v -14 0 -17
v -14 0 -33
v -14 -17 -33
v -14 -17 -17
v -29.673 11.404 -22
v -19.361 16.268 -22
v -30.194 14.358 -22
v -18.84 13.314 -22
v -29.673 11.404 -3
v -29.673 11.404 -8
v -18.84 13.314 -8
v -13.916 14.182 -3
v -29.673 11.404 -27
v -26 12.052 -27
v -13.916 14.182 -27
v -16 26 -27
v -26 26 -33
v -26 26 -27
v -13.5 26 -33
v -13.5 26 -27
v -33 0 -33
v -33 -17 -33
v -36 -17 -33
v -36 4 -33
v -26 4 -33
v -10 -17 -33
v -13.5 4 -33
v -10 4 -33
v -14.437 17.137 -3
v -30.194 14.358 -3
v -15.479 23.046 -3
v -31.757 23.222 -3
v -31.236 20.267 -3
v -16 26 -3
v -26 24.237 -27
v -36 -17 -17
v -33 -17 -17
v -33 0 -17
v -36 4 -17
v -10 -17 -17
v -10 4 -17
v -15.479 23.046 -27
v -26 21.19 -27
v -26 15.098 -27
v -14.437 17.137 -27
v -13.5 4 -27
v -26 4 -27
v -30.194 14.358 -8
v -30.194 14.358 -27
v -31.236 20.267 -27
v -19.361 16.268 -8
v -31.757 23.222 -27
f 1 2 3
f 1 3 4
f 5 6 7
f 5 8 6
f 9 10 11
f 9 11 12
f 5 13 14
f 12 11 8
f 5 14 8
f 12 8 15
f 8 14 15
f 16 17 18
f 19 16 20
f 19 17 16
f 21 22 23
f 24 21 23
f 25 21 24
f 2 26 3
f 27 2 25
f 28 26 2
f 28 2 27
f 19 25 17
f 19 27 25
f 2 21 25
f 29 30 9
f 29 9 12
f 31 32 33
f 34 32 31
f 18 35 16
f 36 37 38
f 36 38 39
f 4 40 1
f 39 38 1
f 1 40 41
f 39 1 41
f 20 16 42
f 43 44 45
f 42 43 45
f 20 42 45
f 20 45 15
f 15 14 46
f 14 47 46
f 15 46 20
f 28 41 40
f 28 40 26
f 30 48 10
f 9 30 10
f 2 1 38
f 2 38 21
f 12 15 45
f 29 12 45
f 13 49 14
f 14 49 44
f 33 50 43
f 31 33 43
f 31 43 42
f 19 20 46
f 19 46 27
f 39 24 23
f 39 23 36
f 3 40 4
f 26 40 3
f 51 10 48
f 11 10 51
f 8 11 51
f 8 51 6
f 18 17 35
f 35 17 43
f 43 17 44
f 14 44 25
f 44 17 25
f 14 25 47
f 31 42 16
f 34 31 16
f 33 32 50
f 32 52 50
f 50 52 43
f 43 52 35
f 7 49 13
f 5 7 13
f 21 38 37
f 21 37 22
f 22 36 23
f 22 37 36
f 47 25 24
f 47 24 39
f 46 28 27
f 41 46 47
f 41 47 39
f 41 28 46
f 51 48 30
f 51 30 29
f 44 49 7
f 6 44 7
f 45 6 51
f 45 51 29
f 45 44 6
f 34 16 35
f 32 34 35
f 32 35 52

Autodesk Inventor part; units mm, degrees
ref_plane "YZ Plane" through (0, 0, 0) normal (1, 0, 0) x (0, 1, 0)
ref_plane "XZ Plane" through (0, 0, 0) normal (0, 1, 0) x (-1, 0, 0)
ref_plane "XY Plane" through (0, 0, 0) normal (0, 0, 1) x (1, 0, 0)
sketch "Sketch1" plane through (0, 0, 0) normal (0, 1, 0) x (-1, 0, 0)
  line L0 (0, 0) -> (26, 0)
  line L1 (26, 0) -> (26, -33)
  line L2 (26, -33) -> (0, -33)
  line L3 (0, -33) -> (0, 0)
  dimension "d0" = 26
  dimension "d1" = 33
extrude "Extrusion1" add sketch "Sketch1" along normal blind 4
sketch "Sketch2" plane through (0, 0, 0) normal (0, -1, 0) x (1, 0, 0)
  line L0 (-26, 0) -> (0, 0) projected
  line L1 (-26, -33) -> (-26, 0) projected
  line L2 (0, -33) -> (-26, -33) projected
  line L3 (0, 0) -> (0, -33) projected
  line L4 (-26, 0) -> (0, 0) projected
  line L5 (-26, -33) -> (-26, 0) projected
  line L6 (0, 0) -> (0, -33) projected
  line L7 (0, -33) -> (-26, -33) projected
  line L8 (0, 0) -> (-4, 0)
  line L9 (-4, 0) -> (-4, -33)
  line L10 (-4, -33) -> (0, -33)
  line L11 (0, -33) -> (0, 0)
  line L12 (-26, -33) -> (-26, 0) projected
  line L13 (-26, 0) -> (-23, 0)
  line L14 (-23, 0) -> (-23, -33)
  line L15 (-23, -33) -> (-26, -33)
  line L16 (-26, -33) -> (-26, 0)
  dimension "d4" = 4
  dimension "d5" = 3
extrude "Extrusion2" add sketch "Sketch2" along normal blind 17 contours L0 L14 L2 L1 | L0 L3 L2 L9
sketch "Sketch3" plane through (0, 4, 0) normal (0, 1, 0) x (1, 0, 0)
  line L0 (0, 33) -> (-26, 33) projected
  line L1 (-26, 33) -> (-26, 0) projected
  line L2 (-26, 0) -> (0, 0) projected
  line L3 (0, 0) -> (0, 33) projected
  line L4 (0, 0) -> (-6, 0)
  line L5 (-6, 0) -> (-6, 33)
  line L6 (-6, 33) -> (0, 33)
  line L7 (0, 33) -> (0, 0)
  line L8 (-6, 33) -> (-26, 33)
  line L9 (-26, 33) -> (-26, 27)
  line L10 (-26, 27) -> (-6, 27)
  line L11 (-6, 27) -> (-6, 33)
  dimension "d8" = 6
  dimension "d9" = 6
extrude "Extrusion3" add sketch "Sketch3" along normal blind 10 contours L5 L10 L1 L0
sketch "Sketch4" plane through (-26, 4, -27) normal (0, 0, 1) x (1, 0, 0)
  line L0 (20, 0) -> (0, 0) projected
  line L1 (20, 0) -> (20, 10) projected
  line L2 (0, 10) -> (20, 10) projected
  line L3 (0, 0) -> (0, 10) projected
  line L4 (20, 10) -> (6, 10)
  line L5 (6, 10) -> (6, 7)
  line L6 (6, 7) -> (20, 7)
  line L7 (20, 7) -> (20, 10)
  line L8 (20, 7) -> (6, 7)
  line L9 (6, 7) -> (6, 1)
  line L10 (6, 1) -> (20, 1)
  line L11 (20, 1) -> (20, 7)
  point P0 (26, -4)
  dimension "d12" = 14
  dimension "d13" = 3
  dimension "d14" = 6
sketch "Sketch5" plane through (0, 14, 0) normal (0, 1, 0) x (1, 0, 0)
  line L0 (-6, 27) -> (-6, 33) projected
  line L1 (-6, 33) -> (-26, 33) projected
  line L2 (-26, 33) -> (-26, 27) projected
  line L3 (-26, 27) -> (-6, 27) projected
  line L4 (-26, 33) -> (-6, 33)
  line L5 (-6, 33) -> (-6, 27)
  line L6 (-6, 27) -> (-26, 27)
  line L7 (-26, 27) -> (-26, 33)
  point P0 (0, 0)
extrude "Extrusion4" add sketch "Sketch5" along normal blind 12
sketch "Sketch6" plane through (-26, 4, -27) normal (0, 0, 1) x (1, 0, 0)
  line L0 (20, 0) -> (20, 22) projected
  line L1 (20, 22) -> (4.2431, 19.2216)
  line L2 (20, 22) -> (36, 22) construction
  line L3 (4.2431, 19.2216) -> (4.764, 16.2672)
  line L4 (4.764, 16.2672) -> (20.5209, 19.0456)
  line L5 (20.5209, 19.0456) -> (20, 22)
  line L6 (4.764, 16.2672) -> (5.8059, 10.3584)
  line L7 (5.8059, 10.3584) -> (6.3269, 7.4039)
  line L8 (6.3269, 7.4039) -> (22.0838, 10.1823)
  line L9 (22.0838, 10.1823) -> (21.5628, 13.1367)
  line L10 (21.5628, 13.1367) -> (5.8059, 10.3584)
  line L11 (20, 0) -> (0, 0) projected
  line L12 (20, 0) -> (20, 22) projected
  line L13 (0, 22) -> (20, 22) projected
  line L14 (0, 0) -> (0, 22) projected
  line L15 (0, -21) -> (0, 22) projected
  line L16 (20, 22) -> (10, 22)
  line L17 (20, 22) -> (0, 22) projected
  line L18 (10, 22) -> (-5.7569, 19.2216)
  line L19 (10, 22) -> (26, 22) construction
  line L20 (-5.7569, 19.2216) -> (-5.236, 16.2672)
  line L21 (-5.236, 16.2672) -> (10.5209, 19.0456)
  line L22 (10.5209, 19.0456) -> (10, 22)
  line L23 (-5.236, 16.2672) -> (-4.1941, 10.3584)
  line L24 (-5.236, 16.2672) -> (0.764, 16.2672) construction
  line L25 (-4.1941, 10.3584) -> (11.5628, 13.1367)
  line L26 (11.5628, 13.1367) -> (10.5209, 19.0456)
  line L27 (-4.1941, 10.3584) -> (-3.6731, 7.4039)
  line L28 (-4.1941, 10.3584) -> (-1.1941, 10.3584) construction
  line L29 (-3.6731, 7.4039) -> (12.0838, 10.1823)
  line L30 (12.0838, 10.1823) -> (11.5628, 13.1367)
  point P0 (26, -4)
  dimension "d17" = 16
  dimension "d18" = 170
  dimension "d19" = 3
  dimension "d20" = 6
  dimension "d21" = 3
  dimension "d22" = 16
  dimension "d27" = 16
  dimension "d28" = 170
  dimension "d29" = 16
  dimension "d30" = 6
  dimension "d31" = 80
  dimension "d32" = 3
  dimension "d33" = 80
  dimension "d34" = 16
extrude "Extrusion5" add sketch "Sketch6" along normal blind 24 contours L29 L27 L25 L14 | L14 L25 L6 L7 L29 | L30 L29 L7 L10 | L10 L6 L25 L30 | L21 L20 L18 L14 | L14 L18 L22 L1 L3 L21 | L22 L21 L3 L1
sketch "Sketch7" plane through (-26, 4, 0) normal (0, 0, 1) x (1, 0, 0)
  line L0 (3, -4) -> (22, -4) projected
  line L1 (22, -4) -> (22, -21) projected
  line L2 (26, -21) -> (22, -21) projected
  line L3 (26, -21) -> (26, 0) projected
  line L4 (0, 0) -> (26, 0) projected
  line L5 (0, -21) -> (0, 0) projected
  line L6 (3, -21) -> (0, -21) projected
  line L7 (3, -4) -> (3, -21) projected
  line L8 (0, -21) -> (3, -21) projected
  line L9 (20, 0) -> (0, 0) projected
  line L10 (3, -21) -> (0, -21)
  line L11 (0, -21) -> (0, 0)
  line L12 (0, 0) -> (3, 0)
  line L13 (3, 0) -> (3, -21)
  line L14 (26, -4) -> (0, -4)
  line L15 (0, -4) -> (0, 0)
  line L16 (0, 0) -> (26, 0)
  line L17 (26, 0) -> (26, -4)
  line L18 (22, -4) -> (22, -21) projected
  line L19 (26, -4) -> (22, -4)
  line L20 (22, -4) -> (22, -21)
  line L21 (22, -21) -> (26, -21)
  line L22 (26, -21) -> (26, -4)
extrude "Extrusion6" cut sketch "Sketch7" against normal blind 17
sketch "Sketch8" plane through (-26, 4, -27) normal (0, 0, 1) x (1, 0, 0)
  line L0 (11.5628, 13.1367) -> (-4.1941, 10.3584) projected
  line L1 (-4.1941, 10.3584) -> (-3.6731, 7.4039) projected
  line L2 (-3.6731, 7.4039) -> (12.0838, 10.1823) projected
  line L3 (12.0838, 10.1823) -> (11.5628, 13.1367) projected
  line L4 (12.0838, 10.1823) -> (0, 8.0516) projected
  line L5 (0, 0) -> (0, 8.0516) projected
  line L6 (20, 0) -> (0, 0) projected
  line L7 (20, 0) -> (20, 22) projected
  line L8 (10, 22) -> (20, 22) projected
  line L9 (10, 22) -> (10.5209, 19.0456) projected
  line L10 (10.5209, 19.0456) -> (0, 17.1905) projected
  line L11 (0, 11.0979) -> (0, 17.1905) projected
  line L12 (0, 11.0979) -> (11.5628, 13.1367) projected
  line L13 (11.5628, 13.1367) -> (12.0838, 10.1823) projected
  point P0 (26, -4)
sketch "Sketch9" plane through (-26, -17, -33) normal (-1, 0, 0) x (0, 0, 1)
  line L0 (16, 0) -> (16, 21) projected
  line L1 (6, 21) -> (16, 21) projected
  line L2 (6, 21) -> (6, 29.0516) projected
  line L3 (6, 29.0516) -> (6, 32.0979) projected
  line L4 (6, 32.0979) -> (6, 38.1905) projected
  line L5 (6, 38.1905) -> (6, 41.2367) projected
  line L6 (6, 41.2367) -> (6, 43) projected
  line L7 (0, 43) -> (6, 43) projected
  line L8 (0, 0) -> (0, 43) projected
  line L9 (16, 0) -> (0, 0) projected
  line L10 (0, 17) -> (0, 0) projected
  line L11 (16, 21) -> (0, 21)
  line L12 (0, 21) -> (0, 0)
  line L13 (0, 0) -> (16, 0)
  line L14 (16, 0) -> (16, 21)
  point P0 (33, 17)
sketch "Sketch10" plane through (-4, -17, -33) normal (-1, 0, 0) x (0, 0, 1)
  line L0 (16, 0) -> (16, 17) projected
  line L1 (0, 17) -> (16, 17) projected
  line L2 (0, 17) -> (0, 0) projected
  line L3 (16, 0) -> (0, 0) projected
  line L4 (16, 17) -> (0, 17)
  line L5 (0, 17) -> (0, 0)
  line L6 (0, 0) -> (16, 0)
  line L7 (16, 0) -> (16, 17)
  point P0 (33, 17)
sketch "Sketch11" plane through (-23, -17, -33) normal (1, 0, 0) x (0, 0, -1)
  line L0 (-16, 17) -> (-16, 0) projected
  line L1 (0, 0) -> (-16, 0) projected
  line L2 (0, 17) -> (0, 0) projected
  line L3 (-16, 17) -> (0, 17) projected
  line L4 (-16, 17) -> (0, 17)
  line L5 (0, 17) -> (0, 0)
  line L6 (0, 0) -> (-16, 0)
  line L7 (-16, 0) -> (-16, 17)
  point P0 (-33, 17)
sketch "Sketch12" plane through (0, -17, -33) normal (1, 0, 0) x (0, 0, -1)
  line L0 (-16, 21) -> (-16, 0) projected
  line L1 (0, 0) -> (-16, 0) projected
  line L2 (0, 21) -> (0, 0) projected
  line L3 (-16, 21) -> (0, 21) projected
  line L4 (0, 17) -> (-16, 17) projected
  line L5 (-16, 21) -> (0, 21)
  line L6 (0, 21) -> (0, 0)
  line L7 (0, 0) -> (-16, 0)
  line L8 (-16, 0) -> (-16, 21)
  point P0 (-33, 17)
extrude "Extrusion7" add sketch "Sketch10" along normal blind 10
extrude "Extrusion8" cut sketch "Sketch12" against normal blind 10
extrude "Extrusion9" add sketch "Sketch9" along normal blind 10 contours L9 L8 L11 L1 L0
extrude "Extrusion10" cut sketch "Sketch11" against normal blind 10
sketch "Sketch13" plane through (-26, 4, -17) normal (0, 0, 1) x (1, 0, 0)
  point P0 (26, -4)
sketch "Sketch15" plane through (-13.9162, 14.1823, -27) normal (0.1736482, -0.9848078, 0) x (0.9848078, 0.1736482, 0)
  line L0 (-16, 0) -> (-12.2702, 0) projected
  line L1 (0, 0) -> (-12.2702, 0) projected
  line L2 (0, 0) -> (0, 24) projected
  line L3 (-16, 24) -> (0, 24) projected
  line L4 (-16, 0) -> (-16, 24) projected
  line L5 (-16, 0) -> (-16, 5)
  line L6 (-16, 24) -> (-16, 19)
  line L7 (-16, 24) -> (-11, 24) construction
  line L8 (-16, 19) -> (-5, 19)
  line L9 (-5, 19) -> (-5, 5)
  line L10 (-5, 5) -> (-16, 5)
  line L11 (-16, 5) -> (-16, 19)
  point P0 (11.2421, 27)
  dimension "d43" = 5
  dimension "d44" = 5
  dimension "d45" = 90
  dimension "d46" = 11
extrude "Extrusion11" cut sketch "Sketch15" against normal blind 4 contours L4 L8 L9 L10
sketch "Sketch16" plane through (-6, 26, -27) normal (1, 0, 0) x (0, 0, -1)
  point P0 (-27, -26)
sketch "Sketch17" plane through (-6, 26, -27) normal (1, 0, 0) x (0, 0, -1)
  line L0 (6, -22) -> (0, -22) projected
  line L1 (6, -22) -> (6, 0) projected
  line L2 (0, 0) -> (6, 0) projected
  line L3 (0, -22) -> (0, 0) projected
  line L4 (0, 0) -> (6, 0)
  line L5 (6, 0) -> (6, -22)
  line L6 (6, -22) -> (0, -22)
  line L7 (0, -22) -> (0, 0)
  point P0 (-27, -26)
extrude "Extrusion12" cut sketch "Sketch17" against normal blind 7.5
properties part number "HolderMagasin_3DPrint"
